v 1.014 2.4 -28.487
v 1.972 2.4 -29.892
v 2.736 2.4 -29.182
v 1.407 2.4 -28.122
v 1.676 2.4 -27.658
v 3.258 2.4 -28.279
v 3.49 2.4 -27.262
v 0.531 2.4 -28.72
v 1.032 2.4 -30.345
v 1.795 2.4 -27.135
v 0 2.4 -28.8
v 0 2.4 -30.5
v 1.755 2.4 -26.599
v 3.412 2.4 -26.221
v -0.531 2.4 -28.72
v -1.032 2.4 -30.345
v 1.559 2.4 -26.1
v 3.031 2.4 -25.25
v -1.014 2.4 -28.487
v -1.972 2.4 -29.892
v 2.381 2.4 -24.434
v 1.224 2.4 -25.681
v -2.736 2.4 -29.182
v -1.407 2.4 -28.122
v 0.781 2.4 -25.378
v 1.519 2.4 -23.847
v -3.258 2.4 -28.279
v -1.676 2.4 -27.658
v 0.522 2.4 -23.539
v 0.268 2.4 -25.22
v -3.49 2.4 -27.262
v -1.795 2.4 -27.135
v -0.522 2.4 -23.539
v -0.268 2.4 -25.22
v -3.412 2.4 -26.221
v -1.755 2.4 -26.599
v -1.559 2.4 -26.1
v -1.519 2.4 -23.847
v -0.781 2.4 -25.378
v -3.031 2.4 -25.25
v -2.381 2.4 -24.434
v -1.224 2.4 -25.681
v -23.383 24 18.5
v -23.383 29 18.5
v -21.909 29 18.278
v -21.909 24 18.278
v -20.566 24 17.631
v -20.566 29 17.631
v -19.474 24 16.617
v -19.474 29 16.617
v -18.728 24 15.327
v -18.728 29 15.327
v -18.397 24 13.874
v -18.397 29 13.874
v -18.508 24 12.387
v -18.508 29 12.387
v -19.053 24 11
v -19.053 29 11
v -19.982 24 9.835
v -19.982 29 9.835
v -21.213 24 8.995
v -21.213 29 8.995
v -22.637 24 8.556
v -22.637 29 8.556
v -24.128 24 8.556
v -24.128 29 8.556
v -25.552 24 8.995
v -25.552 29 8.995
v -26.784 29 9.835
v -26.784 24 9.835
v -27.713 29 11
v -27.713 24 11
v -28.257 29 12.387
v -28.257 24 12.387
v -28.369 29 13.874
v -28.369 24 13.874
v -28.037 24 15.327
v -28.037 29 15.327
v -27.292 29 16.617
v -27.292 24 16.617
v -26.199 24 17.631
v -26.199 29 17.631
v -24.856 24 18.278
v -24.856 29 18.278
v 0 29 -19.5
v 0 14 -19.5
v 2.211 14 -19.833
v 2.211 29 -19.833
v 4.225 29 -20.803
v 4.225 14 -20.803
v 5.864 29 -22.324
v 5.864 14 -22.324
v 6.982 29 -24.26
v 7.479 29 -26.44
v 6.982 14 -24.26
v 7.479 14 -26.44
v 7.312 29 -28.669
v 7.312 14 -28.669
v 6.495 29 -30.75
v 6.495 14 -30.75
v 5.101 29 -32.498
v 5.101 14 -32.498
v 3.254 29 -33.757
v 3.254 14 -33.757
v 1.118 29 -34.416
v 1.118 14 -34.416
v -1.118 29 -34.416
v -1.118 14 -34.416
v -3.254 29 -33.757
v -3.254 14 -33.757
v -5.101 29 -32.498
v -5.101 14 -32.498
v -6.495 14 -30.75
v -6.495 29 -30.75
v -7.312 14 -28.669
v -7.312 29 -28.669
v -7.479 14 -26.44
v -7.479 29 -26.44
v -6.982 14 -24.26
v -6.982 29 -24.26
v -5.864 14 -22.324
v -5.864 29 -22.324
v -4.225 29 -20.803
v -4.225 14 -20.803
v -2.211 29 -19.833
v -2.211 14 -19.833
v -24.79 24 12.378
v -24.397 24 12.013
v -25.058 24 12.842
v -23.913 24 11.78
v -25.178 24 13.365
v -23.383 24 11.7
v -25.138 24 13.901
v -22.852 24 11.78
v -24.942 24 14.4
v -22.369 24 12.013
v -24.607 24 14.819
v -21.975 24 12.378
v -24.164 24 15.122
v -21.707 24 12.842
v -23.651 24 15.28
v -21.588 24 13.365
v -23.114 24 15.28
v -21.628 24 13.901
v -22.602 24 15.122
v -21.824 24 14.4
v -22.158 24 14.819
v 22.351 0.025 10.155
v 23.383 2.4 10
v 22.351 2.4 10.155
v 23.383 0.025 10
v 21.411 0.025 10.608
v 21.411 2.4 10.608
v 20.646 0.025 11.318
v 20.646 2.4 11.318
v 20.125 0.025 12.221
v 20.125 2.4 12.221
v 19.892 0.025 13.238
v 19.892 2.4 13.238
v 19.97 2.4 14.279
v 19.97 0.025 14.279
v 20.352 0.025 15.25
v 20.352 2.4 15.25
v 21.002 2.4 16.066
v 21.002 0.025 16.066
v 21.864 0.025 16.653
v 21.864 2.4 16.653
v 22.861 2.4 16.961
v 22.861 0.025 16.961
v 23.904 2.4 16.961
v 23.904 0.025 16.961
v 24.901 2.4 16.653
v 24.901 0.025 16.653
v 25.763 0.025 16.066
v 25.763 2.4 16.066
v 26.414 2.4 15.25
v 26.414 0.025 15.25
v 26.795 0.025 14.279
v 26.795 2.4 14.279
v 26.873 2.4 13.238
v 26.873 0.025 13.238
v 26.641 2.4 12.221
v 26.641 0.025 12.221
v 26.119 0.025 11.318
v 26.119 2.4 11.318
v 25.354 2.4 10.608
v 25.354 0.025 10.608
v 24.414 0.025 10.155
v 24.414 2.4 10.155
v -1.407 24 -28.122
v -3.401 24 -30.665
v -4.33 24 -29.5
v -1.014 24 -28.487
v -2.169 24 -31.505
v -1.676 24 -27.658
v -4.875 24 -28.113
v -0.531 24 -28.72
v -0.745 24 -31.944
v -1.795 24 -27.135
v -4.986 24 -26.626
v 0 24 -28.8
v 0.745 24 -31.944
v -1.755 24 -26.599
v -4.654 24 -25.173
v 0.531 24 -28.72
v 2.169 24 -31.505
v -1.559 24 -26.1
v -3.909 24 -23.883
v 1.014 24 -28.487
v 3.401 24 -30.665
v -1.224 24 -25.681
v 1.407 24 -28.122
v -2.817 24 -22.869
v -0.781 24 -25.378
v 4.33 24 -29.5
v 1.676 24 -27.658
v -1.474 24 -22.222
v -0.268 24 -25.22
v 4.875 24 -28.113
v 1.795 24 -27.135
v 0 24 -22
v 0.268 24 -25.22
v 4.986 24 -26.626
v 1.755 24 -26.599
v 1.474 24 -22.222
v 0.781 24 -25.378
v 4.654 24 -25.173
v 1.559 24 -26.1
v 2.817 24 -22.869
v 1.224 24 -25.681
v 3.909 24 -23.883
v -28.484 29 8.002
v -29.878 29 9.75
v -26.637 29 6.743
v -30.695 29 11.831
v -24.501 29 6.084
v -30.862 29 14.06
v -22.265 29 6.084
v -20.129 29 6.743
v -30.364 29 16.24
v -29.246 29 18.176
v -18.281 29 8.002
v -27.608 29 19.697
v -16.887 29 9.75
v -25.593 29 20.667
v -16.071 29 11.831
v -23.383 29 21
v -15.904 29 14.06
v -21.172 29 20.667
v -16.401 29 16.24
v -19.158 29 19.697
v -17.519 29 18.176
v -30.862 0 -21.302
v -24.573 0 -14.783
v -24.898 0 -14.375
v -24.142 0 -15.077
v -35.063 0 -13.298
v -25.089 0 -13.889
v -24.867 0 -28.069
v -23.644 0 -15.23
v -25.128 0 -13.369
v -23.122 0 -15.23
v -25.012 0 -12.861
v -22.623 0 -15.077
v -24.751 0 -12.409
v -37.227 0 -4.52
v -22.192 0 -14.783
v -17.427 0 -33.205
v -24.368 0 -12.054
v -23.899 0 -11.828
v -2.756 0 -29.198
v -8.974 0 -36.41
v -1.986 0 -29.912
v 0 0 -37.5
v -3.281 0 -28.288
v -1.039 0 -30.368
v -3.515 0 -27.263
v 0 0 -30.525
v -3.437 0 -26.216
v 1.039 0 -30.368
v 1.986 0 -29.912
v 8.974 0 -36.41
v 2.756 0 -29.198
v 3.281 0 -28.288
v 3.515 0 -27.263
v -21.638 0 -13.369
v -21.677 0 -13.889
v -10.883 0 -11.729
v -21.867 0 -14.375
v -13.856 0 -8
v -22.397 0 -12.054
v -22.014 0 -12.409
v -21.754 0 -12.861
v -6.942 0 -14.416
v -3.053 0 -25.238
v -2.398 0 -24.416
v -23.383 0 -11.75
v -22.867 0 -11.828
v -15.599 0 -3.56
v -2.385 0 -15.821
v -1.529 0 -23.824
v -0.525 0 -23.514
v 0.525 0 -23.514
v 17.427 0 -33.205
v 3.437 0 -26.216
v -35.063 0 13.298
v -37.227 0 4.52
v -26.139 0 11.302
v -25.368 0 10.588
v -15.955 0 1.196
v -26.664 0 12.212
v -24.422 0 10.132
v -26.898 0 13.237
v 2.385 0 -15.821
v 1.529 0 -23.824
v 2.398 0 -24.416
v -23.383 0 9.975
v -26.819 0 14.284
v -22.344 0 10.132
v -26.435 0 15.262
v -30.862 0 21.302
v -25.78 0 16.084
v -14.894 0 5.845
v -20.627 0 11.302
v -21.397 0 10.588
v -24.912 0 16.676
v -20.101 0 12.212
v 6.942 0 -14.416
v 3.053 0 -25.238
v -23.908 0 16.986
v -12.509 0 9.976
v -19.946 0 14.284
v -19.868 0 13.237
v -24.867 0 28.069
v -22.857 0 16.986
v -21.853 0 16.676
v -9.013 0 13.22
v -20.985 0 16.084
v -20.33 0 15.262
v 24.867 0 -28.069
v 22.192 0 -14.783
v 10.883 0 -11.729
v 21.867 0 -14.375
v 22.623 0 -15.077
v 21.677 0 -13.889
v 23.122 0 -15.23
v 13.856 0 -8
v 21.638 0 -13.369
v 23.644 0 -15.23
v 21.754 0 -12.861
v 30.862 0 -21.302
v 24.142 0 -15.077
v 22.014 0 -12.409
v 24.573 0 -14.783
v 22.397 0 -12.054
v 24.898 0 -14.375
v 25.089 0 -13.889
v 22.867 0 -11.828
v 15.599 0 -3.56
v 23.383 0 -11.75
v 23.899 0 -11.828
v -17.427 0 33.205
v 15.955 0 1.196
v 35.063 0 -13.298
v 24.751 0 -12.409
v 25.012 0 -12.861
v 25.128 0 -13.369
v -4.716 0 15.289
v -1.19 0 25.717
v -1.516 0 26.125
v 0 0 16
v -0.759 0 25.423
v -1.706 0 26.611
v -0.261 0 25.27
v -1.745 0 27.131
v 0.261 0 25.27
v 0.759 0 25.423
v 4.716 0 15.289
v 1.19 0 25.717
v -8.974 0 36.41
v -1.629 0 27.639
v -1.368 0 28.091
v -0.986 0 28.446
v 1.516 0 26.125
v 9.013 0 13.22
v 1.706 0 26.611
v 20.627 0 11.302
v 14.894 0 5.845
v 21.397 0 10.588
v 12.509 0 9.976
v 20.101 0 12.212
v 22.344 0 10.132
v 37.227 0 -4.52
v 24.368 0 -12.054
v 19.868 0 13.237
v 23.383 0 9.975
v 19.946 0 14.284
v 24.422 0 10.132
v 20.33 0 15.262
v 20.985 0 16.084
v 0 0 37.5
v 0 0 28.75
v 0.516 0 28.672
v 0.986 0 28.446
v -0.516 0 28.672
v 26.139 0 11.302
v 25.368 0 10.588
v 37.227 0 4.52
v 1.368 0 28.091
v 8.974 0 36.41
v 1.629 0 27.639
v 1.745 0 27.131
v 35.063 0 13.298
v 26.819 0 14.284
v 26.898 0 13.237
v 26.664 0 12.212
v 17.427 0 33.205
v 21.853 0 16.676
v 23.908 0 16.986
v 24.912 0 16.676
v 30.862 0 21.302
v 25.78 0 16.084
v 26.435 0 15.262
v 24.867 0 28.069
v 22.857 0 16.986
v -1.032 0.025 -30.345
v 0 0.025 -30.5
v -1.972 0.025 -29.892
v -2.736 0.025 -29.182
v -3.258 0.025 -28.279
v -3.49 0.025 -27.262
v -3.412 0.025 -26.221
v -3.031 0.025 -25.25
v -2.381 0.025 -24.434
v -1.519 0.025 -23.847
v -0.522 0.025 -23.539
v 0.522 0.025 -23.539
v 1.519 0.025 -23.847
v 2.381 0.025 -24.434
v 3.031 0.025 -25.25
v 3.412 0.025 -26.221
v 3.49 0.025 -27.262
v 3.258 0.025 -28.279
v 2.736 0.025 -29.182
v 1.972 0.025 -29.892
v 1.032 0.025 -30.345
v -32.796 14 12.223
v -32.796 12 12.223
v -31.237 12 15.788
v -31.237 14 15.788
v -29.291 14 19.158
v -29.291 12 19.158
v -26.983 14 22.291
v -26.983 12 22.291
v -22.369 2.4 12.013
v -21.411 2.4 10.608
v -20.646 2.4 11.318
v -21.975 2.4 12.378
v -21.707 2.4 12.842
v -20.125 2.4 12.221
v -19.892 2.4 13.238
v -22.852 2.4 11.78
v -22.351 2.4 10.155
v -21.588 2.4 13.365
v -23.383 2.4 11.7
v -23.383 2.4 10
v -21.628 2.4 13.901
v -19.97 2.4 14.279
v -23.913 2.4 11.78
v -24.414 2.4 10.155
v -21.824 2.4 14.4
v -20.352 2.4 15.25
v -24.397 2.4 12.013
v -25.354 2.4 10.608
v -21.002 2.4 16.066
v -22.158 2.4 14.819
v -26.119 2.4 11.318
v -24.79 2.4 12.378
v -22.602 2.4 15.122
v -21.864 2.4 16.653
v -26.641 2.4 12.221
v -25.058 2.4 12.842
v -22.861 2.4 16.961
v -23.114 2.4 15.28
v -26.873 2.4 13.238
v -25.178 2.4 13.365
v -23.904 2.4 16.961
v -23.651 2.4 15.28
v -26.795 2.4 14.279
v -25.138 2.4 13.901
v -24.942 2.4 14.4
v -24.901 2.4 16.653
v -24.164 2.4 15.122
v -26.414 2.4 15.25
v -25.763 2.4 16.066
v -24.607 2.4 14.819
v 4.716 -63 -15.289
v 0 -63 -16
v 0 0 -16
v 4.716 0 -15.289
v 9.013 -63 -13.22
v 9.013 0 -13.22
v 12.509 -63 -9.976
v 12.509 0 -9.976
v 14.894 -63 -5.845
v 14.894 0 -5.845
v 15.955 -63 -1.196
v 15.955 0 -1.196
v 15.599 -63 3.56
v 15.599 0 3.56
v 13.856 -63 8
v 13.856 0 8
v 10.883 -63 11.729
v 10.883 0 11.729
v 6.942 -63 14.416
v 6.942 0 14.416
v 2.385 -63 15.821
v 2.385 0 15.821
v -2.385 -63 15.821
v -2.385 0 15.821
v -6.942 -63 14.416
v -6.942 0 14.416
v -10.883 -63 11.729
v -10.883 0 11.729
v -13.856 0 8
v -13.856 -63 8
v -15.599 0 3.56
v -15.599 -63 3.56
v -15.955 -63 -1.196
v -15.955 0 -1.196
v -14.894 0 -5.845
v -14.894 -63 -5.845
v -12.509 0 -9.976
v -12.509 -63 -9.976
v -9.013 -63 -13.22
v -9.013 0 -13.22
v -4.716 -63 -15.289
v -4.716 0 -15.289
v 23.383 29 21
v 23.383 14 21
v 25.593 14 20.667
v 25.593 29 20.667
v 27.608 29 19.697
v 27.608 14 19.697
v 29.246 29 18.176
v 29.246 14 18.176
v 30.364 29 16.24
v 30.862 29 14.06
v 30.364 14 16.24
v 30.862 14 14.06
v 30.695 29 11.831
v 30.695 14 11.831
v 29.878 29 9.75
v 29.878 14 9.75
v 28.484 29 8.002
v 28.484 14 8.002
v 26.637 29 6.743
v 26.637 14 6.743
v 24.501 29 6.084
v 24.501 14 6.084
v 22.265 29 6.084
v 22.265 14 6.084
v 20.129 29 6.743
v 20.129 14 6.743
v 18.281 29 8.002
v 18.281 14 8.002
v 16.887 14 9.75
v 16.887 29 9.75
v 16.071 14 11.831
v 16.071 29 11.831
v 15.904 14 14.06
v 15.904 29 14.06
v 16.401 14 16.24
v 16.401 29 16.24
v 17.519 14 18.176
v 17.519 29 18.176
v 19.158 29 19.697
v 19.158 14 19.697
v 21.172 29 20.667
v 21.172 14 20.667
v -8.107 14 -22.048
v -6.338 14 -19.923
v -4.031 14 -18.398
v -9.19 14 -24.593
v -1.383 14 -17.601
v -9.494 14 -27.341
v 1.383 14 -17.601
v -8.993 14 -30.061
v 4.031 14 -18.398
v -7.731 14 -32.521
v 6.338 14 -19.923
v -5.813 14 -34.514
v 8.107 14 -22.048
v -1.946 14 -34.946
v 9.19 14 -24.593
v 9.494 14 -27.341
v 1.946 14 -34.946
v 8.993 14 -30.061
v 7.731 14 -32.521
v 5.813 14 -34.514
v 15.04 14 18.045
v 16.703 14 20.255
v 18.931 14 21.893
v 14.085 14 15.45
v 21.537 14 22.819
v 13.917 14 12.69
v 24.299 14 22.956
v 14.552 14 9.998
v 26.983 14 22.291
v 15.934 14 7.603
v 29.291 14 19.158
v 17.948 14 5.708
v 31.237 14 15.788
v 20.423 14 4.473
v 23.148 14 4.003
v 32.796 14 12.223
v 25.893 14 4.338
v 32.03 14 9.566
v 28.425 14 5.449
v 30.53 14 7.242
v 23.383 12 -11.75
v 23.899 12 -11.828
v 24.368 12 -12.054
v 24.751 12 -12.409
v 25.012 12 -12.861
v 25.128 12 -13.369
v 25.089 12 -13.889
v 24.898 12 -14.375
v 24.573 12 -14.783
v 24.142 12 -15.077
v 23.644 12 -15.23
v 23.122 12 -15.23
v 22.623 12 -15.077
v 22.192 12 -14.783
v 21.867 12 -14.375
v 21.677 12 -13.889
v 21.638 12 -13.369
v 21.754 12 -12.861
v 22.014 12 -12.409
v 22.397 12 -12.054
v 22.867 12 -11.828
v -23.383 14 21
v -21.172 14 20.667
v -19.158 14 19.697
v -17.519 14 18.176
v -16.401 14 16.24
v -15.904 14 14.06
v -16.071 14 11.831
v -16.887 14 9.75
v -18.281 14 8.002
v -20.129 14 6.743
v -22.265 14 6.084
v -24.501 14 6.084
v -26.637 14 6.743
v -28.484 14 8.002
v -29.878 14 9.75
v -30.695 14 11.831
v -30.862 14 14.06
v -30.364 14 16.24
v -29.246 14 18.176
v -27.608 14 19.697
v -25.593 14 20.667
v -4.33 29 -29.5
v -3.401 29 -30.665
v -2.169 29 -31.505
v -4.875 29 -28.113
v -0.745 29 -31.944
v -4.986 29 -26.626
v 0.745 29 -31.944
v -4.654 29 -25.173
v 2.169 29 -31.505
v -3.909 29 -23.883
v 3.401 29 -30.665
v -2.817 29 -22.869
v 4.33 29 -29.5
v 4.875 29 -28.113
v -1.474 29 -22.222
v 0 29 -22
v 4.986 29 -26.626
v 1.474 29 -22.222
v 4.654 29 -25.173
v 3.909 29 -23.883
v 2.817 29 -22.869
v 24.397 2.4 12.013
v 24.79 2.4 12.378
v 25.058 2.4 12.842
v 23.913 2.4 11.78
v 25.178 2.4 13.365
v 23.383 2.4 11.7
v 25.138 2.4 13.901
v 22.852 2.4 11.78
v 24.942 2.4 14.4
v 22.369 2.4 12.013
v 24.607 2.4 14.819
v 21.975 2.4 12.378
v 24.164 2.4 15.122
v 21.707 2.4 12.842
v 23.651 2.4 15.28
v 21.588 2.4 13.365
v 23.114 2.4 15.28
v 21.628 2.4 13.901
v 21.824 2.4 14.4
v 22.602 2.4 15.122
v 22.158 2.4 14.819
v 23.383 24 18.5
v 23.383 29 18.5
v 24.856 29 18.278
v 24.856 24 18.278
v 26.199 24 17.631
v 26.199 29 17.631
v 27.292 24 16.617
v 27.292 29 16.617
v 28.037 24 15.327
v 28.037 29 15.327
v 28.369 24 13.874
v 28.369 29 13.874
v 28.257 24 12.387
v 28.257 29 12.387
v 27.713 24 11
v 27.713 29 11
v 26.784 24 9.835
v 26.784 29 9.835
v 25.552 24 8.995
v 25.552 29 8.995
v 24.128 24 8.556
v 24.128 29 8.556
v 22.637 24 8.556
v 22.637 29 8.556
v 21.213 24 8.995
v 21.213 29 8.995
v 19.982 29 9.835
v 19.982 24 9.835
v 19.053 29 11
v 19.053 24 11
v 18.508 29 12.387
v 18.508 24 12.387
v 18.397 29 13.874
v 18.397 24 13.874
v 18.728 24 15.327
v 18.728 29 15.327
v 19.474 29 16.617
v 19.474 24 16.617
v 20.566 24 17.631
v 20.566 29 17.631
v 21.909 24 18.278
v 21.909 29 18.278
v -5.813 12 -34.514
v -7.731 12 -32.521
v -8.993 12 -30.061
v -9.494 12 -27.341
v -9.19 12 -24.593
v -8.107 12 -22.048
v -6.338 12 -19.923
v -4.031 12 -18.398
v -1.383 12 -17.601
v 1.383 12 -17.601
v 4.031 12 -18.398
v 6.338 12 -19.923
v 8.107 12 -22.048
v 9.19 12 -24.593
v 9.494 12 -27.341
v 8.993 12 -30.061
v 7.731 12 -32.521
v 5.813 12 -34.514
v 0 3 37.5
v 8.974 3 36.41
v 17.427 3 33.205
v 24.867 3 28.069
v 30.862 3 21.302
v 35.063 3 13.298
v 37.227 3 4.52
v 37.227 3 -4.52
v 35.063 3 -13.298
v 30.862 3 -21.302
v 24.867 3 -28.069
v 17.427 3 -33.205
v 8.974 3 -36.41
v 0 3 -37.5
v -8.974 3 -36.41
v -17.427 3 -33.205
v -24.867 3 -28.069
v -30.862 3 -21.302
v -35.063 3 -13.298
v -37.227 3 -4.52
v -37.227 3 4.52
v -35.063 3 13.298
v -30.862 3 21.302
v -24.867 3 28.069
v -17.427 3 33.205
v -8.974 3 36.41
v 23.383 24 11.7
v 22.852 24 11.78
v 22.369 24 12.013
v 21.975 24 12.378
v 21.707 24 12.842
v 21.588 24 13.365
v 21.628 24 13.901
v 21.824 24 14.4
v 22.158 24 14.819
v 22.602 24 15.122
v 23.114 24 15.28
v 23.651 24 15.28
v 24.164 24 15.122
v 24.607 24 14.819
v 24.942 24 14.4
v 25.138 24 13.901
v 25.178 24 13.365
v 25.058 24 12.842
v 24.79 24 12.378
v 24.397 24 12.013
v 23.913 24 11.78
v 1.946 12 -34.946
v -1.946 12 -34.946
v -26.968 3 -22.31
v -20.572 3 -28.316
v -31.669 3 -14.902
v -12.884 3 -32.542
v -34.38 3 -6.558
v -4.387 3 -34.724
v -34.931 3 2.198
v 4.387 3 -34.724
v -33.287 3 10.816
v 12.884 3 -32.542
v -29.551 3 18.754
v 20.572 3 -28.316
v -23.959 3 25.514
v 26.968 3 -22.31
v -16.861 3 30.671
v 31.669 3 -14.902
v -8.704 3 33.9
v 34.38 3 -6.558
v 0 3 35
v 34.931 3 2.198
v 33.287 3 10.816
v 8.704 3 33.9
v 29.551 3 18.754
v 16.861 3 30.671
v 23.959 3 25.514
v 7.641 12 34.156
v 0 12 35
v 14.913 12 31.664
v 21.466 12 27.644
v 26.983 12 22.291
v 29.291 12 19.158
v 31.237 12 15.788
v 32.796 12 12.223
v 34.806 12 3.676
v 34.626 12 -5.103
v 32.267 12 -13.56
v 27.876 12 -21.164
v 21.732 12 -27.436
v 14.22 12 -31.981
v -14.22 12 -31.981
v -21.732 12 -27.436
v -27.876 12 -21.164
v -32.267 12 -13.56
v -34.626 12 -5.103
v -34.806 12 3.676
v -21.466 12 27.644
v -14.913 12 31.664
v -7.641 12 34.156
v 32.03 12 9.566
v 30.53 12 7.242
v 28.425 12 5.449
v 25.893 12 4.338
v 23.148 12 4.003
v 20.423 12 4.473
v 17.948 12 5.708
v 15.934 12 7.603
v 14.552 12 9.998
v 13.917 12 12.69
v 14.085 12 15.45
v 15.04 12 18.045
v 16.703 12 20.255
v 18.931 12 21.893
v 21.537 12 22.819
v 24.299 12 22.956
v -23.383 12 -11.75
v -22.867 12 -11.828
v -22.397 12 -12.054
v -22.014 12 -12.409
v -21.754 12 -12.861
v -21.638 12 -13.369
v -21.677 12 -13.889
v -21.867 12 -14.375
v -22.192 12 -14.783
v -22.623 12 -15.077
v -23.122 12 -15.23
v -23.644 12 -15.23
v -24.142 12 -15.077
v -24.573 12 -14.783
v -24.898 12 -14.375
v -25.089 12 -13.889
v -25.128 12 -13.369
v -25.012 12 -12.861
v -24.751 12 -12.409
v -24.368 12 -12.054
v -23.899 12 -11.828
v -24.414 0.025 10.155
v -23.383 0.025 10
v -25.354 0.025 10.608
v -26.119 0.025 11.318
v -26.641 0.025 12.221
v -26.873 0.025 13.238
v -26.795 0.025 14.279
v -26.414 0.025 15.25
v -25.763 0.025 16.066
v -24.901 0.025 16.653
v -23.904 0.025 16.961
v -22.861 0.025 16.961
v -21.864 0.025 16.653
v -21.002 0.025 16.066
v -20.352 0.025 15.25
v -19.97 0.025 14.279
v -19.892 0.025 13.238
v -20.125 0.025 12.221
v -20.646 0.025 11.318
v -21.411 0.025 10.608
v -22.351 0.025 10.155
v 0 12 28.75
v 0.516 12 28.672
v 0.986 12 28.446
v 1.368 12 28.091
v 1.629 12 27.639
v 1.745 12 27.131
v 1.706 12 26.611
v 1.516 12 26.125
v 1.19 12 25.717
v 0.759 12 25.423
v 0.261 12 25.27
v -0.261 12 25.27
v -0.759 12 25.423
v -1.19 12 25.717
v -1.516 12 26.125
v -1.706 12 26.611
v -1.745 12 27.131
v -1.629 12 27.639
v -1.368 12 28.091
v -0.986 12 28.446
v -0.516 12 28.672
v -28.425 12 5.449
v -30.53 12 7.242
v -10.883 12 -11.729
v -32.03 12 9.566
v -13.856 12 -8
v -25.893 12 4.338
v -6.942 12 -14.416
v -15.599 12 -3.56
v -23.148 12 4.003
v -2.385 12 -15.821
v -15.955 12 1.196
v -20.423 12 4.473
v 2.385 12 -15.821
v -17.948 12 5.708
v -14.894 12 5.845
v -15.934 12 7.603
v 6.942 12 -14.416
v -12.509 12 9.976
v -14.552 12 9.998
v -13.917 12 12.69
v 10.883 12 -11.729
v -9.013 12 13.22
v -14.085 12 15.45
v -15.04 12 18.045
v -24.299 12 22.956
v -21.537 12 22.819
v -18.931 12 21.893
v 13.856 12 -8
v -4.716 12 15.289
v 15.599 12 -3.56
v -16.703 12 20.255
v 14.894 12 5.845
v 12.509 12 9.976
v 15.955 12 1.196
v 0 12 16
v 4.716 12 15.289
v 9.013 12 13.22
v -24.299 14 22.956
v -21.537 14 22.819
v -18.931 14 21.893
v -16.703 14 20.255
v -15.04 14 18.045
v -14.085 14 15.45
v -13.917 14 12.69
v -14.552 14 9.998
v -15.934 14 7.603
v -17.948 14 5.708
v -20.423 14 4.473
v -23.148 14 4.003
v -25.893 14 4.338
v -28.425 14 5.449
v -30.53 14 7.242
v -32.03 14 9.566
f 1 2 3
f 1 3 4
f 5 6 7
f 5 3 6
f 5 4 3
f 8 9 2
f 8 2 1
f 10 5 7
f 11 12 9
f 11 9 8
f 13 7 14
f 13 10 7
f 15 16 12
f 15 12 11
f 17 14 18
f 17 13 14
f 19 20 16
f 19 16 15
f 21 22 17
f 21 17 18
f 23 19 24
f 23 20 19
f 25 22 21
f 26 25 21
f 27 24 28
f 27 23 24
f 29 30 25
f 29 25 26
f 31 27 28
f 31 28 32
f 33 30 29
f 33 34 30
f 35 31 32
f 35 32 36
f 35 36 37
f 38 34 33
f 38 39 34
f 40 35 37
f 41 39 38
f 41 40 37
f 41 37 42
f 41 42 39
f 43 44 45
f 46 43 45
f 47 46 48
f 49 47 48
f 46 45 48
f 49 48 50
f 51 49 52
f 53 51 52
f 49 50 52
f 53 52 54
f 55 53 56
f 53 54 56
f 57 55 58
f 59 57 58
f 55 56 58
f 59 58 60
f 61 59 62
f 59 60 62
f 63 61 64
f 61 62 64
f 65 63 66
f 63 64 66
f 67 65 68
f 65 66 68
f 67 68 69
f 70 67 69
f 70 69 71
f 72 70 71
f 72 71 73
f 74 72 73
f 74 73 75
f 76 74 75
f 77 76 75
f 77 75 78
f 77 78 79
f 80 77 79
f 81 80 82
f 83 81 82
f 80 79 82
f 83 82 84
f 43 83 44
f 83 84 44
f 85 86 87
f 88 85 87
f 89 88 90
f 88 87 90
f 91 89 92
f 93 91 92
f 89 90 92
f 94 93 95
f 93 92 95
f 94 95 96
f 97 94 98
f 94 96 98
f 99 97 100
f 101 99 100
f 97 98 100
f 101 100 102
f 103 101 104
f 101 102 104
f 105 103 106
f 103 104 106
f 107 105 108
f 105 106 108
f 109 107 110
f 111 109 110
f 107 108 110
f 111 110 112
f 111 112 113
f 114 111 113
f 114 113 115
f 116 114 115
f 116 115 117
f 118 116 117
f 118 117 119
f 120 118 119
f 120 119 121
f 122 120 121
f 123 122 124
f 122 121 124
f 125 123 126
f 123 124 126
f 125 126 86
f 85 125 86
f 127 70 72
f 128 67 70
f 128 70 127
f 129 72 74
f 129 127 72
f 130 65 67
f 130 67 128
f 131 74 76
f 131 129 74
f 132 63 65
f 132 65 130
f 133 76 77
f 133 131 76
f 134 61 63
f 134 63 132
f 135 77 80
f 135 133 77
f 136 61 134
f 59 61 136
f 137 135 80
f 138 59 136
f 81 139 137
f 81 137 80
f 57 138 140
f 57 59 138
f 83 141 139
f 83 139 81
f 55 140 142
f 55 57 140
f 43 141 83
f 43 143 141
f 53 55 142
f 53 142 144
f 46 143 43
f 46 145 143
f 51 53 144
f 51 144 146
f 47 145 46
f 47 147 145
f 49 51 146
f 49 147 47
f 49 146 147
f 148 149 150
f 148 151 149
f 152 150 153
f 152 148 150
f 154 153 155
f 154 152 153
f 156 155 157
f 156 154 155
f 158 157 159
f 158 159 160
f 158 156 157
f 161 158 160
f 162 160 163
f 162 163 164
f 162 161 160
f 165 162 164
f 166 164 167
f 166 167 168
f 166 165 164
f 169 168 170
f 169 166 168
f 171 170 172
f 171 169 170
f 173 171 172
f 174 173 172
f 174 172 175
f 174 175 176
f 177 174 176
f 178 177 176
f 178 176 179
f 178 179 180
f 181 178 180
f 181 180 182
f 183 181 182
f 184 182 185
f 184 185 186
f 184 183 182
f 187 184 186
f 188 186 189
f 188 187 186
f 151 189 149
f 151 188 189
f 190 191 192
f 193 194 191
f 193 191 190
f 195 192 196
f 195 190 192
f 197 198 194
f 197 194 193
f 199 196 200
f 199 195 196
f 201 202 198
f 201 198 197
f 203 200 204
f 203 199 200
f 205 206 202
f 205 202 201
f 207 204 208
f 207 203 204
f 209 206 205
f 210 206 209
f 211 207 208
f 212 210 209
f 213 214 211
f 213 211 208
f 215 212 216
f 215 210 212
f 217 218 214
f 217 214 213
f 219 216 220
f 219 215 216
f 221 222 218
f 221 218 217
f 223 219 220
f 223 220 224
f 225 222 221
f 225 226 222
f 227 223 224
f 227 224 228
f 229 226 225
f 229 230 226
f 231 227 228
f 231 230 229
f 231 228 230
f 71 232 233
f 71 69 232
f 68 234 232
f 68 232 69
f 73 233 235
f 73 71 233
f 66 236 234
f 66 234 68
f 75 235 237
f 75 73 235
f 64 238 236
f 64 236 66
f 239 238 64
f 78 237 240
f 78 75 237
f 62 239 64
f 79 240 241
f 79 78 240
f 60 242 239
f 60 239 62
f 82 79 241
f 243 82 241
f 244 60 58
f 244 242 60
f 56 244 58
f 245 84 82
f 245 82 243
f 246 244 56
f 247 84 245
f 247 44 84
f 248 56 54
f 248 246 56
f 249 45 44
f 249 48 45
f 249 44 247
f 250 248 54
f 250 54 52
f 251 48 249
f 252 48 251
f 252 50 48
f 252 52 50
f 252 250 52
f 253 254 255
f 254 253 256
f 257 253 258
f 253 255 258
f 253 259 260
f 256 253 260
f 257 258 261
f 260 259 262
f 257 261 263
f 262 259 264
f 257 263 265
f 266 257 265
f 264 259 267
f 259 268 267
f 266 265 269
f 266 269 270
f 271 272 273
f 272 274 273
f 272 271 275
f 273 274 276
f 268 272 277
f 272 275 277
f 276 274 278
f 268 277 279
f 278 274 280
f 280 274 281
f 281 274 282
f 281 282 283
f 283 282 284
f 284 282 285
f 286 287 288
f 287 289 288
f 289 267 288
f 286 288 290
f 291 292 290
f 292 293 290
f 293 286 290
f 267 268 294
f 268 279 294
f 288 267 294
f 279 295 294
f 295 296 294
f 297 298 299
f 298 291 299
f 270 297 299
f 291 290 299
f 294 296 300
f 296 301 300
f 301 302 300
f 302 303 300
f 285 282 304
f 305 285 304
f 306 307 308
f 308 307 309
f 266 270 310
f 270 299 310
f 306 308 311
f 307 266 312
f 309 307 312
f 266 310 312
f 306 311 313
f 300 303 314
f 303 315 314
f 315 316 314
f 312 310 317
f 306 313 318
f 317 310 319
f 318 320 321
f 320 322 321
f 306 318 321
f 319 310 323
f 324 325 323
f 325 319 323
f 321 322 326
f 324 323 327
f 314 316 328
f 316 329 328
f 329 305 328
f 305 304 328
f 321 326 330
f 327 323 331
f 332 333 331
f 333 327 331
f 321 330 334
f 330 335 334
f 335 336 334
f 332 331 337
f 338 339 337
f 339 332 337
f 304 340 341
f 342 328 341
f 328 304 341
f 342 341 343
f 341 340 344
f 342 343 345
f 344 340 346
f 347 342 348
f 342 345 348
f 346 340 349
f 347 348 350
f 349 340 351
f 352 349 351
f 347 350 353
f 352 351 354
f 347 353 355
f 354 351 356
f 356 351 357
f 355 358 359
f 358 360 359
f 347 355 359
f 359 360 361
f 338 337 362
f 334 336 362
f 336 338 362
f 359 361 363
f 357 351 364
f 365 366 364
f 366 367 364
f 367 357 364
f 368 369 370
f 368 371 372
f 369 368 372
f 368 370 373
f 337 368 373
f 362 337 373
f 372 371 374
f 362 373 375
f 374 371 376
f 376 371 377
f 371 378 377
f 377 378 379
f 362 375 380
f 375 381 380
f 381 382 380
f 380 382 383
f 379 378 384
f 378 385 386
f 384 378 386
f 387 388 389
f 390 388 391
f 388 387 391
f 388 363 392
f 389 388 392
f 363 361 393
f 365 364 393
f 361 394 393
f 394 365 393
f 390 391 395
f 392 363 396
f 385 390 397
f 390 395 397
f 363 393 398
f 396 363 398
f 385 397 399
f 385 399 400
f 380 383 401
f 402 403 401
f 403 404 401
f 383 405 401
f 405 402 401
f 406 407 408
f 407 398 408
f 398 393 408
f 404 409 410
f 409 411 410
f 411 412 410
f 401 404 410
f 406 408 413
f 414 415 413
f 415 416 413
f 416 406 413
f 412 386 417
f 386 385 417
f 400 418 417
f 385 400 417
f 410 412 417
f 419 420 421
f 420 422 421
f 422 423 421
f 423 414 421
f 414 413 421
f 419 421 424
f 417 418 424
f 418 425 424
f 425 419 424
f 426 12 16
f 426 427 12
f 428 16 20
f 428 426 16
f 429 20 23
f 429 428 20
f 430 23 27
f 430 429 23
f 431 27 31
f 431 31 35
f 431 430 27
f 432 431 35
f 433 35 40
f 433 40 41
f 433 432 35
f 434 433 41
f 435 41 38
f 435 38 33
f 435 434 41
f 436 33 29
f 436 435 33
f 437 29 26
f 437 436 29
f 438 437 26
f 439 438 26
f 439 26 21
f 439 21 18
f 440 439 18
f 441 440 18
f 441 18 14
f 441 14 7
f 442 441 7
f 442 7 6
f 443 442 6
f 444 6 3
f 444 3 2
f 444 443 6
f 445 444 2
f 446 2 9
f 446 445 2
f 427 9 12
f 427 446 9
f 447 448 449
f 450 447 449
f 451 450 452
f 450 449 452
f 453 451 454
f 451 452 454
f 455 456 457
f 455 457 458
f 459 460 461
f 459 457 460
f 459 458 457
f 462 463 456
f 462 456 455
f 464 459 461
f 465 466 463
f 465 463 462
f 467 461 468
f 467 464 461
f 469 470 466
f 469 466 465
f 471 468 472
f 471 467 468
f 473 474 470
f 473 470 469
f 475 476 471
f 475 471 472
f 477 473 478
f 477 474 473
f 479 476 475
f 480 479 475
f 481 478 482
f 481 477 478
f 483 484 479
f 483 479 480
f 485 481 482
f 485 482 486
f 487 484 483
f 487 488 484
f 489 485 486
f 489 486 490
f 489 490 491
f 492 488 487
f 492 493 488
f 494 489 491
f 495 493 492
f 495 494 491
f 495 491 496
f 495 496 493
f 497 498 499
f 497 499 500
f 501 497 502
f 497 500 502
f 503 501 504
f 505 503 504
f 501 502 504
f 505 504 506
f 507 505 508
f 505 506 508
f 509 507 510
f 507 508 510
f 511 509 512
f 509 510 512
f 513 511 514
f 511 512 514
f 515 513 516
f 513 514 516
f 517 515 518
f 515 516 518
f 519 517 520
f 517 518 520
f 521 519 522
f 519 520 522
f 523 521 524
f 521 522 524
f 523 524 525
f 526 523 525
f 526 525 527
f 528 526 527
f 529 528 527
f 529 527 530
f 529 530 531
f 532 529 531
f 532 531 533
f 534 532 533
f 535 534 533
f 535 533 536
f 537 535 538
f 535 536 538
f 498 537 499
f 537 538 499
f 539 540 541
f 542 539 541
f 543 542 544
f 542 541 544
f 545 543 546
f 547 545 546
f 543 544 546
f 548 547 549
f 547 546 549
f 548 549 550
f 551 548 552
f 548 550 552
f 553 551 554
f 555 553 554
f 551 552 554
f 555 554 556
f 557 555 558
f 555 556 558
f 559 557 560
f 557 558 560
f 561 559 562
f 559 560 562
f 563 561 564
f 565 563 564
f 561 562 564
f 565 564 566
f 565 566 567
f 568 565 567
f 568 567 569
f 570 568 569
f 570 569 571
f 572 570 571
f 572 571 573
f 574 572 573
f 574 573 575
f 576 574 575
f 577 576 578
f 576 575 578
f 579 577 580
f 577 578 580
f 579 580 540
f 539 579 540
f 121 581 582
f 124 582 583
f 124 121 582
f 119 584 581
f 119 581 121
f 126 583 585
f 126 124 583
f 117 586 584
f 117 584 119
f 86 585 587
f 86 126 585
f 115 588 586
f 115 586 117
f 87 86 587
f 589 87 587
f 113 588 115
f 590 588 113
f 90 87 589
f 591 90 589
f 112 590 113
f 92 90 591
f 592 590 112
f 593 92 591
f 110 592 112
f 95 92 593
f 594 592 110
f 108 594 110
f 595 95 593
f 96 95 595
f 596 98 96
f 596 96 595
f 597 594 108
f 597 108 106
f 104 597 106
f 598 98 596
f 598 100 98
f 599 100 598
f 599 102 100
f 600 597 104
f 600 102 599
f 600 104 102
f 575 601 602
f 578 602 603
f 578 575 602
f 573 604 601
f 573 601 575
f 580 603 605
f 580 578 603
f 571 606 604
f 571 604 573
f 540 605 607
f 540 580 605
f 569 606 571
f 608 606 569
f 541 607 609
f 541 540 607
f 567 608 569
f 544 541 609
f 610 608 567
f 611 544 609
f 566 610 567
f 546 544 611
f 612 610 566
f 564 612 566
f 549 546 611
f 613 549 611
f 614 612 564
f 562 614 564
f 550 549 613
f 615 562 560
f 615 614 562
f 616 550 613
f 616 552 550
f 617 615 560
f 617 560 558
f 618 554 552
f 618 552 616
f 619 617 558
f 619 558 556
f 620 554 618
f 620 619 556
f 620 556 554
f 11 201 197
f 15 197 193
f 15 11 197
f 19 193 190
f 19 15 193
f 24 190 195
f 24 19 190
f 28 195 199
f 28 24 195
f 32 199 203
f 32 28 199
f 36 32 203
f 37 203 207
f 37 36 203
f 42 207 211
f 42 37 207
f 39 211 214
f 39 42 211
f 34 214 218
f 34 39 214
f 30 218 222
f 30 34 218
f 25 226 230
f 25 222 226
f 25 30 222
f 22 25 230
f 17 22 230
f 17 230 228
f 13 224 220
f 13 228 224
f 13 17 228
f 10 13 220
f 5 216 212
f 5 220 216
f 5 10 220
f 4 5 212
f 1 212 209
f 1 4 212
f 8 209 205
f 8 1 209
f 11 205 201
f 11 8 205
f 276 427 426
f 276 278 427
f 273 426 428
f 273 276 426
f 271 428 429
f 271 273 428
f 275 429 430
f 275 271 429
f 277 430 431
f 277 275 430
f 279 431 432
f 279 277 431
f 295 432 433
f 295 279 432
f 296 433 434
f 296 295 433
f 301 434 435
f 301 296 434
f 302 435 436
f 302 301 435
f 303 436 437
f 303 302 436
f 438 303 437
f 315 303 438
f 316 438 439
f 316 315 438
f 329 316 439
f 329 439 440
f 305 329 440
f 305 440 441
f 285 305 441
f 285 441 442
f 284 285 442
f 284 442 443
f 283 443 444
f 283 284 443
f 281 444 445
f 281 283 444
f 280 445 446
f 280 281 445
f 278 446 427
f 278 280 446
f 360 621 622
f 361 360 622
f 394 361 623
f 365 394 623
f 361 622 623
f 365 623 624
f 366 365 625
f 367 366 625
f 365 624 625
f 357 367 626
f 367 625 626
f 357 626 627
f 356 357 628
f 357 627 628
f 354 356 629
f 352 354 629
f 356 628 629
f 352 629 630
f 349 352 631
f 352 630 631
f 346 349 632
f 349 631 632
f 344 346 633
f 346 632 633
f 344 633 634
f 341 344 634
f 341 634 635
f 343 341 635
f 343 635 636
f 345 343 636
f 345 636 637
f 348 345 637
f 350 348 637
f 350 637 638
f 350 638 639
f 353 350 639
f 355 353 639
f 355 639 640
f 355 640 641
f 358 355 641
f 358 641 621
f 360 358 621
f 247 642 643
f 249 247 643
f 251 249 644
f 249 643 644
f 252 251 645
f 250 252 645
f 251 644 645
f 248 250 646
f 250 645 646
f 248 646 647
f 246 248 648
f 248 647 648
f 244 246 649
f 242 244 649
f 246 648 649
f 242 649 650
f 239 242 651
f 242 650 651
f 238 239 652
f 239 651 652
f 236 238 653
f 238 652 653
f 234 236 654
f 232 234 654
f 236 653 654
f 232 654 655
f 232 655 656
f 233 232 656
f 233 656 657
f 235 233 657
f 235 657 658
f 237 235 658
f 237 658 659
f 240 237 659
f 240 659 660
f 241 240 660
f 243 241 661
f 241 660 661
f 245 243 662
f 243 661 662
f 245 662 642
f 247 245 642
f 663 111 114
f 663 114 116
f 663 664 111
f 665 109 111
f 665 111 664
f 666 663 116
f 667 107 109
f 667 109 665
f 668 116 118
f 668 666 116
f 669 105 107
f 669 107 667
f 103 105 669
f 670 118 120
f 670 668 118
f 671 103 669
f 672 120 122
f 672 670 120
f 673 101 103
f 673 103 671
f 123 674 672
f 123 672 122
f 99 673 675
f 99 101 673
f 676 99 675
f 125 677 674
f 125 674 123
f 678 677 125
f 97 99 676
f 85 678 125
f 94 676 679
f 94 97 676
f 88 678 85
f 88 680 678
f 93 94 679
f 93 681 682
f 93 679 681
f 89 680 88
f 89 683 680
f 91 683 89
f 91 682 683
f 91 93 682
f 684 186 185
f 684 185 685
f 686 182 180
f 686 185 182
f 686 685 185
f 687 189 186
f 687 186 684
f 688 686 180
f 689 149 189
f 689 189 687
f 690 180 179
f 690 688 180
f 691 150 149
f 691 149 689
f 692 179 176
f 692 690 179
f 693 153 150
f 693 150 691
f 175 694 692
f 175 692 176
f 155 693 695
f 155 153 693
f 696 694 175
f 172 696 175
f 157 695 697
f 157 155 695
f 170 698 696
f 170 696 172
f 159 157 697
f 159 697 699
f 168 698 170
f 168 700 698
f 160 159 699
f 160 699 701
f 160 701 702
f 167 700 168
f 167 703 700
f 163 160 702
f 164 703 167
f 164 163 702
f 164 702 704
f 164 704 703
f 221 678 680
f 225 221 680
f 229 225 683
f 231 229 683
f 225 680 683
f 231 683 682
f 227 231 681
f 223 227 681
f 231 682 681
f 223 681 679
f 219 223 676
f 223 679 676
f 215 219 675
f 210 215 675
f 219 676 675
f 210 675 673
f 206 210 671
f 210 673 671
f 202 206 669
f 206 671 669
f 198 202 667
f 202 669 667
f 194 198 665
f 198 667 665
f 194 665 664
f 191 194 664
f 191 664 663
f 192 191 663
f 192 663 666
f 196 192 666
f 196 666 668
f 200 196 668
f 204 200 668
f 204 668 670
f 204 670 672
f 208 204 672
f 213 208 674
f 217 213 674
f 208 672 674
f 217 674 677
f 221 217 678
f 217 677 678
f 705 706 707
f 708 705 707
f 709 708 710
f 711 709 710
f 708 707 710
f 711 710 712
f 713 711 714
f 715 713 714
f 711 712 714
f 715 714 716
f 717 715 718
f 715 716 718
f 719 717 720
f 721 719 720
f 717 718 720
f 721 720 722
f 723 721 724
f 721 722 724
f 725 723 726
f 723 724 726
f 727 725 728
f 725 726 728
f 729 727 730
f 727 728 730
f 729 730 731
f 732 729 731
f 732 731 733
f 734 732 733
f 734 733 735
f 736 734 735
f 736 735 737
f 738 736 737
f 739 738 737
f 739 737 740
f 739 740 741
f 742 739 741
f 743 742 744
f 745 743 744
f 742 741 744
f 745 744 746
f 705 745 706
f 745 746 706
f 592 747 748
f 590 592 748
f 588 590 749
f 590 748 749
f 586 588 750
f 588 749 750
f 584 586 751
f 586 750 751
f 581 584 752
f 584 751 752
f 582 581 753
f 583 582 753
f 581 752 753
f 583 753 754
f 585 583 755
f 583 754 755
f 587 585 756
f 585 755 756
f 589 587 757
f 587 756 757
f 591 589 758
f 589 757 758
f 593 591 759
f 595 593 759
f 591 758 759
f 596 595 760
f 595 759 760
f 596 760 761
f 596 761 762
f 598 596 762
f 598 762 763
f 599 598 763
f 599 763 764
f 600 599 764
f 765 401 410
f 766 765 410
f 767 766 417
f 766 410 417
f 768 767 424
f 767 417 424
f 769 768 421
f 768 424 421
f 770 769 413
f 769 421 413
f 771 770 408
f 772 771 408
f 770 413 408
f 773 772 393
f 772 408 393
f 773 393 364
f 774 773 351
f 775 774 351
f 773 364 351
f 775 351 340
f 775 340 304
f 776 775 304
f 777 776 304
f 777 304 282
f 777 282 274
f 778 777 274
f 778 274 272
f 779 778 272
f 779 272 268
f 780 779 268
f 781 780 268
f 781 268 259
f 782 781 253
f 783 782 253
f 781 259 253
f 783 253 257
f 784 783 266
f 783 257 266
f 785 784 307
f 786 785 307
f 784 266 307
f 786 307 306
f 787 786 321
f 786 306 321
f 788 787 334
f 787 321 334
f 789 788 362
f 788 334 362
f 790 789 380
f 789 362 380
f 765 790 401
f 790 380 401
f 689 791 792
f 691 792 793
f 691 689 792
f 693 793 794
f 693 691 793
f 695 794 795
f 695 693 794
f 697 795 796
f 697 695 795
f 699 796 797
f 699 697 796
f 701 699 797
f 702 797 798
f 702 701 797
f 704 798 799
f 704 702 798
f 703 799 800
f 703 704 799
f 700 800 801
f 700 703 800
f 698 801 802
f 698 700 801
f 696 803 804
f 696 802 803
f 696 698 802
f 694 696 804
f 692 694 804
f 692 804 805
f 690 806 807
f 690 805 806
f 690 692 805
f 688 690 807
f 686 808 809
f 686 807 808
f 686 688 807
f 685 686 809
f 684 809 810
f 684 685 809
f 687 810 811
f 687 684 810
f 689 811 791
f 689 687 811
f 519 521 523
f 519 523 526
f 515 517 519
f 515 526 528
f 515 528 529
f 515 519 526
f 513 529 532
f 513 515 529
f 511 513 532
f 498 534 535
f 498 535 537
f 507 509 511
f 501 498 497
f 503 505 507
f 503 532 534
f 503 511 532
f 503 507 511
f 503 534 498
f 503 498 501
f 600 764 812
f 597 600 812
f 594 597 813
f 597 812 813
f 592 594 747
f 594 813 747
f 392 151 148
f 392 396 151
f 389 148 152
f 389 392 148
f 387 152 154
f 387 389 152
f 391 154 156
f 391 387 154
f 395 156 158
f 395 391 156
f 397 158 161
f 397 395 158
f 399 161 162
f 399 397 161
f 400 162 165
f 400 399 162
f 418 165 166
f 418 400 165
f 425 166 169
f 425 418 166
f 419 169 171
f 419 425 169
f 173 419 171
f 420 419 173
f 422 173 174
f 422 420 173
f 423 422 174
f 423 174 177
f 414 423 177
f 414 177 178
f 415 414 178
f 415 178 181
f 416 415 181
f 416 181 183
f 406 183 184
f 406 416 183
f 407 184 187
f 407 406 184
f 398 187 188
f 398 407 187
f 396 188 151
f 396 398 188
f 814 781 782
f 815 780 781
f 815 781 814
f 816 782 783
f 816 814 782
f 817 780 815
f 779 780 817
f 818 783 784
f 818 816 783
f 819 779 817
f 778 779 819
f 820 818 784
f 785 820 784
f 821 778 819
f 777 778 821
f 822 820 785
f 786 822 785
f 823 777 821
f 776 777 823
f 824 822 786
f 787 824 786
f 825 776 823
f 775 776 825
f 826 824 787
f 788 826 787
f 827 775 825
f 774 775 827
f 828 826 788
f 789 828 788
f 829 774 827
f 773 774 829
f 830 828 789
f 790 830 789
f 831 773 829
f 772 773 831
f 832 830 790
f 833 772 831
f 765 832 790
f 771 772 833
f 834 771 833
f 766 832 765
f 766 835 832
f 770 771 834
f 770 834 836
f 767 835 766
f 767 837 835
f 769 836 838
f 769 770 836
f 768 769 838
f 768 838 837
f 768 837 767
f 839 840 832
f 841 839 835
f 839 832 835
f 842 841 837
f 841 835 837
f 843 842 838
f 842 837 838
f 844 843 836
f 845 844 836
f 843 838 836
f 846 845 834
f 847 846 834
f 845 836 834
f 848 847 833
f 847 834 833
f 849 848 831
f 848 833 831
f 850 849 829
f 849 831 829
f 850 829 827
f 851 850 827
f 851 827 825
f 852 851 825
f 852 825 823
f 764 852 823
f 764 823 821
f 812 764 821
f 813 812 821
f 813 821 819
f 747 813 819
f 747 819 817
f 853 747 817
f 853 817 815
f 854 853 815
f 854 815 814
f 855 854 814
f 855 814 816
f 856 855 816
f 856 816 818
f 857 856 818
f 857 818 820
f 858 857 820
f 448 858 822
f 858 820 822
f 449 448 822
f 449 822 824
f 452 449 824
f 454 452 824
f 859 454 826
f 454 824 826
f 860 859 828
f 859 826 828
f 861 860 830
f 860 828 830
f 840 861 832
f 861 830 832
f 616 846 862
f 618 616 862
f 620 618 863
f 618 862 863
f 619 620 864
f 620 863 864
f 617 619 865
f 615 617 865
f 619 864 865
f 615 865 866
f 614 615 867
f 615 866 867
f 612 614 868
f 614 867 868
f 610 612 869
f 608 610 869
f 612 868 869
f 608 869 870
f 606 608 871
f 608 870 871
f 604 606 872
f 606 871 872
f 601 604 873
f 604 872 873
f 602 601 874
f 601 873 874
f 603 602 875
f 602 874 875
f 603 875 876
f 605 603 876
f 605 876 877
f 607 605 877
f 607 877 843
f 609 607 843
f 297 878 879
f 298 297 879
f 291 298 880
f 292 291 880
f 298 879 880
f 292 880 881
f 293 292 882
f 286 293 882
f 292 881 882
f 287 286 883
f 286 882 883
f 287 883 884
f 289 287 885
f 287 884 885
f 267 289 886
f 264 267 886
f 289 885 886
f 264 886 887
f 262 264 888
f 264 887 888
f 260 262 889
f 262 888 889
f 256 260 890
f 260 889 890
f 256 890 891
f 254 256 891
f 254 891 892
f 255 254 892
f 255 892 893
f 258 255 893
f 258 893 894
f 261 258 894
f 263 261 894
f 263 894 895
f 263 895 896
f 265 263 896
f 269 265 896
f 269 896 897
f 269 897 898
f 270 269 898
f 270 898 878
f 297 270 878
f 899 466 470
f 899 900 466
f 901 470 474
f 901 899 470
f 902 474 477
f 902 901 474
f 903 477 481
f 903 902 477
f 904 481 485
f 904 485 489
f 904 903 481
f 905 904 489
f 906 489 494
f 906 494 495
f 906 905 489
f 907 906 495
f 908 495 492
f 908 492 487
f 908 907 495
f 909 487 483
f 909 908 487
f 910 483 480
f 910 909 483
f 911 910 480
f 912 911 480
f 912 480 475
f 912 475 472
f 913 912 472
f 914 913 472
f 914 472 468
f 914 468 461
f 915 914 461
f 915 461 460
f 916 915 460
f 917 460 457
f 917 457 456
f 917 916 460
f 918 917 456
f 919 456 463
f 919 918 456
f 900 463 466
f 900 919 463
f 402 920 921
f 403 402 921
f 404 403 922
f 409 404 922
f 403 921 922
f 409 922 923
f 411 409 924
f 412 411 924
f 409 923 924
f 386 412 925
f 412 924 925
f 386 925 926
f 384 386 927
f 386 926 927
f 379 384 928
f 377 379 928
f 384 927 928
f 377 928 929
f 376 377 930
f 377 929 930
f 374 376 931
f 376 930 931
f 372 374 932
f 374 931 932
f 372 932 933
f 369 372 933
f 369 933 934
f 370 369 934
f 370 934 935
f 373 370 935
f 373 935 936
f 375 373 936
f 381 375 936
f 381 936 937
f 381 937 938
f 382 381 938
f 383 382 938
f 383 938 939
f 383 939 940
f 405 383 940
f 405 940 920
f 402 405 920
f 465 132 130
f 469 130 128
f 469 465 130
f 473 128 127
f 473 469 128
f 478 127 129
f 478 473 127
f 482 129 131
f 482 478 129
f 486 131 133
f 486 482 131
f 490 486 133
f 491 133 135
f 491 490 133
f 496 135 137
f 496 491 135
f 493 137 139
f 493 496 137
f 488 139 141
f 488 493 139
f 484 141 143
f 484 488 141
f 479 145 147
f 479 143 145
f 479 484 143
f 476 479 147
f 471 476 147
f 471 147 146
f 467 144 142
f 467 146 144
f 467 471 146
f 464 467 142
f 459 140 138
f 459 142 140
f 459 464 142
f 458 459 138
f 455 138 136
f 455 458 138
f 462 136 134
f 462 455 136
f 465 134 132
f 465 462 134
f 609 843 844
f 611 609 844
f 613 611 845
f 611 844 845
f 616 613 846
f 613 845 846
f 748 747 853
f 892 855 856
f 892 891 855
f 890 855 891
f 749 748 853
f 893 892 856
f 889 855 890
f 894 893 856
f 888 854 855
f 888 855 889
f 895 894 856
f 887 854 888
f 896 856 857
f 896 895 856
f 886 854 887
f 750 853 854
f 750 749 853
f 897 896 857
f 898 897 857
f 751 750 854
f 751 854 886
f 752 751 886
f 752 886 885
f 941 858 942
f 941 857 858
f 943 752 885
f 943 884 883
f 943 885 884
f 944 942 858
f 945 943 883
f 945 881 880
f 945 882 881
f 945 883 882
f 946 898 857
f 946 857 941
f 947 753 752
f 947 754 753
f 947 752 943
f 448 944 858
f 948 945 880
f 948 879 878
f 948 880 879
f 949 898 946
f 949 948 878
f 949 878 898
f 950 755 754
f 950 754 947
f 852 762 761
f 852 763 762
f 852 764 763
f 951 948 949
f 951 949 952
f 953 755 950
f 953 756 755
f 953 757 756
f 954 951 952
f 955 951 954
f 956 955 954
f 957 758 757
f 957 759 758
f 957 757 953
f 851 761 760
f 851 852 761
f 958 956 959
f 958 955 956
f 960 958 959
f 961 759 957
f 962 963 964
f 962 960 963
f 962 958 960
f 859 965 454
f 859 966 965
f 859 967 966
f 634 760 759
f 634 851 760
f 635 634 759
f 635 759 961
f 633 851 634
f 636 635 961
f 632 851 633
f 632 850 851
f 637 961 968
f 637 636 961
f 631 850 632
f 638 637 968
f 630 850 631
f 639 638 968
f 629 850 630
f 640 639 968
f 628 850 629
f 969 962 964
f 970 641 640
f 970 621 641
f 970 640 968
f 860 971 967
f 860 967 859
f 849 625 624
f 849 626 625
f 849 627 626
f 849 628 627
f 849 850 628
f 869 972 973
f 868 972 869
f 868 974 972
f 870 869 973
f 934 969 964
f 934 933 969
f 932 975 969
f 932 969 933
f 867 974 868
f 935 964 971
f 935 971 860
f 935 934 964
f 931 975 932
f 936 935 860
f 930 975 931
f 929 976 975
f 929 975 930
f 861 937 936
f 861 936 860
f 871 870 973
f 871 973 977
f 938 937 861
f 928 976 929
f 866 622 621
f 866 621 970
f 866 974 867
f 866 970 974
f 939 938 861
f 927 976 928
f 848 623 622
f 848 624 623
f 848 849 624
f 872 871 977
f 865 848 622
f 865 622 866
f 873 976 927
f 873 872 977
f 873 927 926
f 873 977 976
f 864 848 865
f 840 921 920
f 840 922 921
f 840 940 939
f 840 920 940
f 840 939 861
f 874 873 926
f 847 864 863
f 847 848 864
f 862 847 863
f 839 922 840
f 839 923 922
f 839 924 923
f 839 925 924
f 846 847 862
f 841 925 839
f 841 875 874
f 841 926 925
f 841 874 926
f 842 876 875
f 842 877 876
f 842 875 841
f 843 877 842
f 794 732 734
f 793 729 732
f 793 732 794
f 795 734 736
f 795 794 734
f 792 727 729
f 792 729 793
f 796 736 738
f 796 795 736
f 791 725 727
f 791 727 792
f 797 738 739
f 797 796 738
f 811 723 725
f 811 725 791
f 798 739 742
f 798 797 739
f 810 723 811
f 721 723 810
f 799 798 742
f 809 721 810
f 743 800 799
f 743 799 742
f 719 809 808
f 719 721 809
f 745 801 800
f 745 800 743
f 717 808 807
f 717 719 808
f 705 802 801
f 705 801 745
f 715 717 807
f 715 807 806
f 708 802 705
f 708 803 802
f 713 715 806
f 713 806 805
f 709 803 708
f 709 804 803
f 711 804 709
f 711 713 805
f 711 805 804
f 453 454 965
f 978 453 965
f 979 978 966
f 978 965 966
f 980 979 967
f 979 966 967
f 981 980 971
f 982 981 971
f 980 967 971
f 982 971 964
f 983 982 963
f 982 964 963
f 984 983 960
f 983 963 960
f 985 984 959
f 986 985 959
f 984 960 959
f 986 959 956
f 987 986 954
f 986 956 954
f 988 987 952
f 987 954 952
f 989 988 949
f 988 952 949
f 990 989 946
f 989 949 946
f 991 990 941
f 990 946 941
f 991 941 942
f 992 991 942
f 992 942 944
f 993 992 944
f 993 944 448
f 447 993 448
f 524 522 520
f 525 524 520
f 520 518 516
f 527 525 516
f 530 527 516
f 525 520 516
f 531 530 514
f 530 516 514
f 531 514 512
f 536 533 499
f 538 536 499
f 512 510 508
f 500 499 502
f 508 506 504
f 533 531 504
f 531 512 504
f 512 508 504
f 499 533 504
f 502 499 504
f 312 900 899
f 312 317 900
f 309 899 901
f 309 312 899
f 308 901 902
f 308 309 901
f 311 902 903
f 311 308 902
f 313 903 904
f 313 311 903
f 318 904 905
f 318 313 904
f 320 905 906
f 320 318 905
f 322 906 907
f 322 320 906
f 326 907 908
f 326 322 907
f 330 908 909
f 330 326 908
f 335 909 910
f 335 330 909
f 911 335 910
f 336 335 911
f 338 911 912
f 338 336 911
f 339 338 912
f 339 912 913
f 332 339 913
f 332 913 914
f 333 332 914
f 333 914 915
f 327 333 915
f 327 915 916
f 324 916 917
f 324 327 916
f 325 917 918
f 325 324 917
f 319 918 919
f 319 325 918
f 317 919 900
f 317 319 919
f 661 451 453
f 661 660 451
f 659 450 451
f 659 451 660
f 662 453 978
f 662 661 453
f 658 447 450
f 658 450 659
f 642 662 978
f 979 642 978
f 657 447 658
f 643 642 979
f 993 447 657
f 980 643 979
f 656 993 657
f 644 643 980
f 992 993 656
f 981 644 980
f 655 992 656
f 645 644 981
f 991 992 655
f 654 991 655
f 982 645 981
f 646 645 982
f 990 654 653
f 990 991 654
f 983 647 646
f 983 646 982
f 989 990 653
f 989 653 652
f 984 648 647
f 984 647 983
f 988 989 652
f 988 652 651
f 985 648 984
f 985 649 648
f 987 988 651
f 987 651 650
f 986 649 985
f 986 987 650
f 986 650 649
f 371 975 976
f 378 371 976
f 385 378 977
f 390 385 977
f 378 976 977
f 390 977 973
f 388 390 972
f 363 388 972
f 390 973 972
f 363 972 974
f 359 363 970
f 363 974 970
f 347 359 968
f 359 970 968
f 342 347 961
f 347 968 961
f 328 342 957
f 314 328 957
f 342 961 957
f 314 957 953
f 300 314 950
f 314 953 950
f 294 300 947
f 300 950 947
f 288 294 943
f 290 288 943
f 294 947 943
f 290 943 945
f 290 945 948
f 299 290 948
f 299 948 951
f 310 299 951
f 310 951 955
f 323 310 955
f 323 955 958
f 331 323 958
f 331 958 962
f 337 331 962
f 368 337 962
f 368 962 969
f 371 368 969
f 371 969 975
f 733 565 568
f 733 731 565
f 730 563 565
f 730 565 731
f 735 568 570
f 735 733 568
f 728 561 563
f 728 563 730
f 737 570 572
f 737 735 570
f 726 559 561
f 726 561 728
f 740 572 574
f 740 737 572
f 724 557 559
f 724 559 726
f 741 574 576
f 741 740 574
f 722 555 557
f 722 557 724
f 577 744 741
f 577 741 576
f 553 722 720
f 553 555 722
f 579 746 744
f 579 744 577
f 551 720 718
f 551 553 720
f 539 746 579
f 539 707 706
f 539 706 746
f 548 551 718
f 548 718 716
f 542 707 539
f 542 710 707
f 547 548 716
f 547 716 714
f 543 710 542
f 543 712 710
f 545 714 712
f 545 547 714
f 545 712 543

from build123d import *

# Parameters (mm, degrees)
SKETCH1_R                                     = 37.5
BOSS_EXTRUDE1_DEPTH                           = 3
SKETCH1_3_R                                   = 35
BOSS_EXTRUDE2_DEPTH                           = 12
SKETCH13_R                                    = 16
CUT_EXTRUDE6_DEPTH                            = 55.373706881
BOSS_EXTRUDE9_DEPTH                           = 2
SKETCH25_R                                    = 7.5
BOSS_EXTRUDE10_DEPTH                          = 15
SKETCH26_R                                    = 5
CUT_EXTRUDE9_DEPTH                            = 5
CBORE_FOR_M3_PAN_HEAD_MACHINE_SCREW1_AT_COUNT = 2
CBORE_FOR_M3_PAN_HEAD_MACHINE_SCREW1_AT_PITCH = 46.765371804
CBORE_FOR_M3_PAN_HEAD_MACHINE_SCREW1_2_COUNT  = 2
CBORE_FOR_M3_PAN_HEAD_MACHINE_SCREW1_2_PITCH  = 46.765371804
SKETCH29_R                                    = 1.75
CUT_EXTRUDE10_DEPTH                           = 56.691112397
SKETCH30_R                                    = 16
BOSS_EXTRUDE11_DEPTH                          = 63


with BuildPart() as part:
    # Sketch1 → Boss-Extrude1 (new body)
    with BuildSketch(Plane(origin=(0, 0, 0), x_dir=(1, 0, 0), z_dir=(0, 1, 0))):
        Circle(SKETCH1_R)
    extrude(amount=BOSS_EXTRUDE1_DEPTH)

    # Sketch1<3> → Boss-Extrude2 (add)
    with BuildSketch(Plane(origin=(0, 0, 0), x_dir=(1, 0, 0), z_dir=(0, 1, 0))):
        Circle(SKETCH1_3_R)
    extrude(amount=BOSS_EXTRUDE2_DEPTH)

    # Sketch13 → Cut-Extrude6 (cut, through all)
    with BuildSketch(Plane(origin=(0, 12, 0), x_dir=(1, 0, 0), z_dir=(0, 1, 0))):
        Circle(SKETCH13_R)
    extrude(amount=-CUT_EXTRUDE6_DEPTH, mode=Mode.SUBTRACT)

    # Sketch24 → Boss-Extrude9 (add)
    with BuildSketch(Plane(origin=(0, 12, 0), x_dir=(1, 0, 0), z_dir=(0, 1, 0))):
        with BuildLine():
            ThreePointArc((5.813043417, 34.513888889), (0, 35), (-5.813043417, 34.513888889))
            ThreePointArc((-5.813043417, 34.513888889), (0, 17.5), (5.813043417, 34.513888889))
        make_face()
        with BuildLine():
            ThreePointArc((-26.983382853, -22.291187717), (-15.155444566, -8.75), (-32.79642627, -12.222701172))
            ThreePointArc((-32.79642627, -12.222701172), (-30.310889132, -17.5), (-26.983382853, -22.291187717))
        make_face()
        with BuildLine():
            ThreePointArc((26.983382853, -22.291187717), (30.310889132, -17.5), (32.79642627, -12.222701172))
            ThreePointArc((32.79642627, -12.222701172), (15.155444566, -8.75), (26.983382853, -22.291187717))
        make_face()
    extrude(amount=BOSS_EXTRUDE9_DEPTH)

    # Sketch25 → Boss-Extrude10 (add)
    with BuildSketch(Plane(origin=(0, 14, 0), x_dir=(1, 0, 0), z_dir=(0, 1, 0))):
        with Locations((0, 27)):
            Circle(SKETCH25_R)
        with Locations((23.382685902, -13.5)):
            Circle(SKETCH25_R)
        with Locations((-23.382685902, -13.5)):
            Circle(SKETCH25_R)
    extrude(amount=BOSS_EXTRUDE10_DEPTH)

    # Sketch26 → Cut-Extrude9 (cut)
    with BuildSketch(Plane(origin=(0, 29, 0), x_dir=(1, 0, 0), z_dir=(0, 1, 0))):
        with Locations((0, 27)):
            Circle(SKETCH26_R)
        with Locations((23.382685902, -13.5)):
            Circle(SKETCH26_R)
        with Locations((-23.382685902, -13.5)):
            Circle(SKETCH26_R)
    extrude(amount=-CUT_EXTRUDE9_DEPTH, mode=Mode.SUBTRACT)

    # Sketch28 → CBORE for M3 Pan Head Machine Screw1 (revolve, cut)
    with BuildSketch(Plane(origin=(0, 0, -27), x_dir=(0, 0, -1), z_dir=(1, 0, 0))):
        Polygon((0, 0), (0, 29), (1.8, 29), (1.8, 2.4), (3.5, 2.4), (3.5, 0.025), (3.525, 0), align=None)
    cbore_for_m3_pan_head_machine_screw1 = revolve(axis=Axis((0, -6.35, -27), (0, 1, 0)), mode=Mode.SUBTRACT)

    # CBORE for M3 Pan Head Machine Screw1 at: CBORE for M3 Pan Head Machine Screw1 ×2
    with Locations(*[Vector(-0.5000000000000369, 0, 0.8660254037844174) * (i * CBORE_FOR_M3_PAN_HEAD_MACHINE_SCREW1_AT_PITCH) for i in range(1, CBORE_FOR_M3_PAN_HEAD_MACHINE_SCREW1_AT_COUNT)]):
        add(cbore_for_m3_pan_head_machine_screw1, mode=Mode.SUBTRACT)

    # CBORE for M3 Pan Head Machine Screw1 2: CBORE for M3 Pan Head Machine Screw1 ×2
    with Locations(*[Vector(0.49999999999996353, 0, 0.8660254037844598) * (i * CBORE_FOR_M3_PAN_HEAD_MACHINE_SCREW1_2_PITCH) for i in range(1, CBORE_FOR_M3_PAN_HEAD_MACHINE_SCREW1_2_COUNT)]):
        add(cbore_for_m3_pan_head_machine_screw1, mode=Mode.SUBTRACT)

    # Sketch29 → Cut-Extrude10 (cut, through all)
    with BuildSketch(Plane(origin=(0, 12, 0), x_dir=(1, 0, 0), z_dir=(0, 1, 0))):
        with Locations((23.382685902, 13.5)):
            Circle(SKETCH29_R)
        with Locations((0, -27)):
            Circle(SKETCH29_R)
        with Locations((-23.382685902, 13.5)):
            Circle(SKETCH29_R)
    extrude(amount=-CUT_EXTRUDE10_DEPTH, mode=Mode.SUBTRACT)


with BuildPart() as body_2:
    # Sketch30 → Boss-Extrude11 (new body)
    with BuildSketch(Plane.XZ):
        Circle(SKETCH30_R)
    extrude(amount=BOSS_EXTRUDE11_DEPTH)


solid = Compound([part.part, body_2.part])
